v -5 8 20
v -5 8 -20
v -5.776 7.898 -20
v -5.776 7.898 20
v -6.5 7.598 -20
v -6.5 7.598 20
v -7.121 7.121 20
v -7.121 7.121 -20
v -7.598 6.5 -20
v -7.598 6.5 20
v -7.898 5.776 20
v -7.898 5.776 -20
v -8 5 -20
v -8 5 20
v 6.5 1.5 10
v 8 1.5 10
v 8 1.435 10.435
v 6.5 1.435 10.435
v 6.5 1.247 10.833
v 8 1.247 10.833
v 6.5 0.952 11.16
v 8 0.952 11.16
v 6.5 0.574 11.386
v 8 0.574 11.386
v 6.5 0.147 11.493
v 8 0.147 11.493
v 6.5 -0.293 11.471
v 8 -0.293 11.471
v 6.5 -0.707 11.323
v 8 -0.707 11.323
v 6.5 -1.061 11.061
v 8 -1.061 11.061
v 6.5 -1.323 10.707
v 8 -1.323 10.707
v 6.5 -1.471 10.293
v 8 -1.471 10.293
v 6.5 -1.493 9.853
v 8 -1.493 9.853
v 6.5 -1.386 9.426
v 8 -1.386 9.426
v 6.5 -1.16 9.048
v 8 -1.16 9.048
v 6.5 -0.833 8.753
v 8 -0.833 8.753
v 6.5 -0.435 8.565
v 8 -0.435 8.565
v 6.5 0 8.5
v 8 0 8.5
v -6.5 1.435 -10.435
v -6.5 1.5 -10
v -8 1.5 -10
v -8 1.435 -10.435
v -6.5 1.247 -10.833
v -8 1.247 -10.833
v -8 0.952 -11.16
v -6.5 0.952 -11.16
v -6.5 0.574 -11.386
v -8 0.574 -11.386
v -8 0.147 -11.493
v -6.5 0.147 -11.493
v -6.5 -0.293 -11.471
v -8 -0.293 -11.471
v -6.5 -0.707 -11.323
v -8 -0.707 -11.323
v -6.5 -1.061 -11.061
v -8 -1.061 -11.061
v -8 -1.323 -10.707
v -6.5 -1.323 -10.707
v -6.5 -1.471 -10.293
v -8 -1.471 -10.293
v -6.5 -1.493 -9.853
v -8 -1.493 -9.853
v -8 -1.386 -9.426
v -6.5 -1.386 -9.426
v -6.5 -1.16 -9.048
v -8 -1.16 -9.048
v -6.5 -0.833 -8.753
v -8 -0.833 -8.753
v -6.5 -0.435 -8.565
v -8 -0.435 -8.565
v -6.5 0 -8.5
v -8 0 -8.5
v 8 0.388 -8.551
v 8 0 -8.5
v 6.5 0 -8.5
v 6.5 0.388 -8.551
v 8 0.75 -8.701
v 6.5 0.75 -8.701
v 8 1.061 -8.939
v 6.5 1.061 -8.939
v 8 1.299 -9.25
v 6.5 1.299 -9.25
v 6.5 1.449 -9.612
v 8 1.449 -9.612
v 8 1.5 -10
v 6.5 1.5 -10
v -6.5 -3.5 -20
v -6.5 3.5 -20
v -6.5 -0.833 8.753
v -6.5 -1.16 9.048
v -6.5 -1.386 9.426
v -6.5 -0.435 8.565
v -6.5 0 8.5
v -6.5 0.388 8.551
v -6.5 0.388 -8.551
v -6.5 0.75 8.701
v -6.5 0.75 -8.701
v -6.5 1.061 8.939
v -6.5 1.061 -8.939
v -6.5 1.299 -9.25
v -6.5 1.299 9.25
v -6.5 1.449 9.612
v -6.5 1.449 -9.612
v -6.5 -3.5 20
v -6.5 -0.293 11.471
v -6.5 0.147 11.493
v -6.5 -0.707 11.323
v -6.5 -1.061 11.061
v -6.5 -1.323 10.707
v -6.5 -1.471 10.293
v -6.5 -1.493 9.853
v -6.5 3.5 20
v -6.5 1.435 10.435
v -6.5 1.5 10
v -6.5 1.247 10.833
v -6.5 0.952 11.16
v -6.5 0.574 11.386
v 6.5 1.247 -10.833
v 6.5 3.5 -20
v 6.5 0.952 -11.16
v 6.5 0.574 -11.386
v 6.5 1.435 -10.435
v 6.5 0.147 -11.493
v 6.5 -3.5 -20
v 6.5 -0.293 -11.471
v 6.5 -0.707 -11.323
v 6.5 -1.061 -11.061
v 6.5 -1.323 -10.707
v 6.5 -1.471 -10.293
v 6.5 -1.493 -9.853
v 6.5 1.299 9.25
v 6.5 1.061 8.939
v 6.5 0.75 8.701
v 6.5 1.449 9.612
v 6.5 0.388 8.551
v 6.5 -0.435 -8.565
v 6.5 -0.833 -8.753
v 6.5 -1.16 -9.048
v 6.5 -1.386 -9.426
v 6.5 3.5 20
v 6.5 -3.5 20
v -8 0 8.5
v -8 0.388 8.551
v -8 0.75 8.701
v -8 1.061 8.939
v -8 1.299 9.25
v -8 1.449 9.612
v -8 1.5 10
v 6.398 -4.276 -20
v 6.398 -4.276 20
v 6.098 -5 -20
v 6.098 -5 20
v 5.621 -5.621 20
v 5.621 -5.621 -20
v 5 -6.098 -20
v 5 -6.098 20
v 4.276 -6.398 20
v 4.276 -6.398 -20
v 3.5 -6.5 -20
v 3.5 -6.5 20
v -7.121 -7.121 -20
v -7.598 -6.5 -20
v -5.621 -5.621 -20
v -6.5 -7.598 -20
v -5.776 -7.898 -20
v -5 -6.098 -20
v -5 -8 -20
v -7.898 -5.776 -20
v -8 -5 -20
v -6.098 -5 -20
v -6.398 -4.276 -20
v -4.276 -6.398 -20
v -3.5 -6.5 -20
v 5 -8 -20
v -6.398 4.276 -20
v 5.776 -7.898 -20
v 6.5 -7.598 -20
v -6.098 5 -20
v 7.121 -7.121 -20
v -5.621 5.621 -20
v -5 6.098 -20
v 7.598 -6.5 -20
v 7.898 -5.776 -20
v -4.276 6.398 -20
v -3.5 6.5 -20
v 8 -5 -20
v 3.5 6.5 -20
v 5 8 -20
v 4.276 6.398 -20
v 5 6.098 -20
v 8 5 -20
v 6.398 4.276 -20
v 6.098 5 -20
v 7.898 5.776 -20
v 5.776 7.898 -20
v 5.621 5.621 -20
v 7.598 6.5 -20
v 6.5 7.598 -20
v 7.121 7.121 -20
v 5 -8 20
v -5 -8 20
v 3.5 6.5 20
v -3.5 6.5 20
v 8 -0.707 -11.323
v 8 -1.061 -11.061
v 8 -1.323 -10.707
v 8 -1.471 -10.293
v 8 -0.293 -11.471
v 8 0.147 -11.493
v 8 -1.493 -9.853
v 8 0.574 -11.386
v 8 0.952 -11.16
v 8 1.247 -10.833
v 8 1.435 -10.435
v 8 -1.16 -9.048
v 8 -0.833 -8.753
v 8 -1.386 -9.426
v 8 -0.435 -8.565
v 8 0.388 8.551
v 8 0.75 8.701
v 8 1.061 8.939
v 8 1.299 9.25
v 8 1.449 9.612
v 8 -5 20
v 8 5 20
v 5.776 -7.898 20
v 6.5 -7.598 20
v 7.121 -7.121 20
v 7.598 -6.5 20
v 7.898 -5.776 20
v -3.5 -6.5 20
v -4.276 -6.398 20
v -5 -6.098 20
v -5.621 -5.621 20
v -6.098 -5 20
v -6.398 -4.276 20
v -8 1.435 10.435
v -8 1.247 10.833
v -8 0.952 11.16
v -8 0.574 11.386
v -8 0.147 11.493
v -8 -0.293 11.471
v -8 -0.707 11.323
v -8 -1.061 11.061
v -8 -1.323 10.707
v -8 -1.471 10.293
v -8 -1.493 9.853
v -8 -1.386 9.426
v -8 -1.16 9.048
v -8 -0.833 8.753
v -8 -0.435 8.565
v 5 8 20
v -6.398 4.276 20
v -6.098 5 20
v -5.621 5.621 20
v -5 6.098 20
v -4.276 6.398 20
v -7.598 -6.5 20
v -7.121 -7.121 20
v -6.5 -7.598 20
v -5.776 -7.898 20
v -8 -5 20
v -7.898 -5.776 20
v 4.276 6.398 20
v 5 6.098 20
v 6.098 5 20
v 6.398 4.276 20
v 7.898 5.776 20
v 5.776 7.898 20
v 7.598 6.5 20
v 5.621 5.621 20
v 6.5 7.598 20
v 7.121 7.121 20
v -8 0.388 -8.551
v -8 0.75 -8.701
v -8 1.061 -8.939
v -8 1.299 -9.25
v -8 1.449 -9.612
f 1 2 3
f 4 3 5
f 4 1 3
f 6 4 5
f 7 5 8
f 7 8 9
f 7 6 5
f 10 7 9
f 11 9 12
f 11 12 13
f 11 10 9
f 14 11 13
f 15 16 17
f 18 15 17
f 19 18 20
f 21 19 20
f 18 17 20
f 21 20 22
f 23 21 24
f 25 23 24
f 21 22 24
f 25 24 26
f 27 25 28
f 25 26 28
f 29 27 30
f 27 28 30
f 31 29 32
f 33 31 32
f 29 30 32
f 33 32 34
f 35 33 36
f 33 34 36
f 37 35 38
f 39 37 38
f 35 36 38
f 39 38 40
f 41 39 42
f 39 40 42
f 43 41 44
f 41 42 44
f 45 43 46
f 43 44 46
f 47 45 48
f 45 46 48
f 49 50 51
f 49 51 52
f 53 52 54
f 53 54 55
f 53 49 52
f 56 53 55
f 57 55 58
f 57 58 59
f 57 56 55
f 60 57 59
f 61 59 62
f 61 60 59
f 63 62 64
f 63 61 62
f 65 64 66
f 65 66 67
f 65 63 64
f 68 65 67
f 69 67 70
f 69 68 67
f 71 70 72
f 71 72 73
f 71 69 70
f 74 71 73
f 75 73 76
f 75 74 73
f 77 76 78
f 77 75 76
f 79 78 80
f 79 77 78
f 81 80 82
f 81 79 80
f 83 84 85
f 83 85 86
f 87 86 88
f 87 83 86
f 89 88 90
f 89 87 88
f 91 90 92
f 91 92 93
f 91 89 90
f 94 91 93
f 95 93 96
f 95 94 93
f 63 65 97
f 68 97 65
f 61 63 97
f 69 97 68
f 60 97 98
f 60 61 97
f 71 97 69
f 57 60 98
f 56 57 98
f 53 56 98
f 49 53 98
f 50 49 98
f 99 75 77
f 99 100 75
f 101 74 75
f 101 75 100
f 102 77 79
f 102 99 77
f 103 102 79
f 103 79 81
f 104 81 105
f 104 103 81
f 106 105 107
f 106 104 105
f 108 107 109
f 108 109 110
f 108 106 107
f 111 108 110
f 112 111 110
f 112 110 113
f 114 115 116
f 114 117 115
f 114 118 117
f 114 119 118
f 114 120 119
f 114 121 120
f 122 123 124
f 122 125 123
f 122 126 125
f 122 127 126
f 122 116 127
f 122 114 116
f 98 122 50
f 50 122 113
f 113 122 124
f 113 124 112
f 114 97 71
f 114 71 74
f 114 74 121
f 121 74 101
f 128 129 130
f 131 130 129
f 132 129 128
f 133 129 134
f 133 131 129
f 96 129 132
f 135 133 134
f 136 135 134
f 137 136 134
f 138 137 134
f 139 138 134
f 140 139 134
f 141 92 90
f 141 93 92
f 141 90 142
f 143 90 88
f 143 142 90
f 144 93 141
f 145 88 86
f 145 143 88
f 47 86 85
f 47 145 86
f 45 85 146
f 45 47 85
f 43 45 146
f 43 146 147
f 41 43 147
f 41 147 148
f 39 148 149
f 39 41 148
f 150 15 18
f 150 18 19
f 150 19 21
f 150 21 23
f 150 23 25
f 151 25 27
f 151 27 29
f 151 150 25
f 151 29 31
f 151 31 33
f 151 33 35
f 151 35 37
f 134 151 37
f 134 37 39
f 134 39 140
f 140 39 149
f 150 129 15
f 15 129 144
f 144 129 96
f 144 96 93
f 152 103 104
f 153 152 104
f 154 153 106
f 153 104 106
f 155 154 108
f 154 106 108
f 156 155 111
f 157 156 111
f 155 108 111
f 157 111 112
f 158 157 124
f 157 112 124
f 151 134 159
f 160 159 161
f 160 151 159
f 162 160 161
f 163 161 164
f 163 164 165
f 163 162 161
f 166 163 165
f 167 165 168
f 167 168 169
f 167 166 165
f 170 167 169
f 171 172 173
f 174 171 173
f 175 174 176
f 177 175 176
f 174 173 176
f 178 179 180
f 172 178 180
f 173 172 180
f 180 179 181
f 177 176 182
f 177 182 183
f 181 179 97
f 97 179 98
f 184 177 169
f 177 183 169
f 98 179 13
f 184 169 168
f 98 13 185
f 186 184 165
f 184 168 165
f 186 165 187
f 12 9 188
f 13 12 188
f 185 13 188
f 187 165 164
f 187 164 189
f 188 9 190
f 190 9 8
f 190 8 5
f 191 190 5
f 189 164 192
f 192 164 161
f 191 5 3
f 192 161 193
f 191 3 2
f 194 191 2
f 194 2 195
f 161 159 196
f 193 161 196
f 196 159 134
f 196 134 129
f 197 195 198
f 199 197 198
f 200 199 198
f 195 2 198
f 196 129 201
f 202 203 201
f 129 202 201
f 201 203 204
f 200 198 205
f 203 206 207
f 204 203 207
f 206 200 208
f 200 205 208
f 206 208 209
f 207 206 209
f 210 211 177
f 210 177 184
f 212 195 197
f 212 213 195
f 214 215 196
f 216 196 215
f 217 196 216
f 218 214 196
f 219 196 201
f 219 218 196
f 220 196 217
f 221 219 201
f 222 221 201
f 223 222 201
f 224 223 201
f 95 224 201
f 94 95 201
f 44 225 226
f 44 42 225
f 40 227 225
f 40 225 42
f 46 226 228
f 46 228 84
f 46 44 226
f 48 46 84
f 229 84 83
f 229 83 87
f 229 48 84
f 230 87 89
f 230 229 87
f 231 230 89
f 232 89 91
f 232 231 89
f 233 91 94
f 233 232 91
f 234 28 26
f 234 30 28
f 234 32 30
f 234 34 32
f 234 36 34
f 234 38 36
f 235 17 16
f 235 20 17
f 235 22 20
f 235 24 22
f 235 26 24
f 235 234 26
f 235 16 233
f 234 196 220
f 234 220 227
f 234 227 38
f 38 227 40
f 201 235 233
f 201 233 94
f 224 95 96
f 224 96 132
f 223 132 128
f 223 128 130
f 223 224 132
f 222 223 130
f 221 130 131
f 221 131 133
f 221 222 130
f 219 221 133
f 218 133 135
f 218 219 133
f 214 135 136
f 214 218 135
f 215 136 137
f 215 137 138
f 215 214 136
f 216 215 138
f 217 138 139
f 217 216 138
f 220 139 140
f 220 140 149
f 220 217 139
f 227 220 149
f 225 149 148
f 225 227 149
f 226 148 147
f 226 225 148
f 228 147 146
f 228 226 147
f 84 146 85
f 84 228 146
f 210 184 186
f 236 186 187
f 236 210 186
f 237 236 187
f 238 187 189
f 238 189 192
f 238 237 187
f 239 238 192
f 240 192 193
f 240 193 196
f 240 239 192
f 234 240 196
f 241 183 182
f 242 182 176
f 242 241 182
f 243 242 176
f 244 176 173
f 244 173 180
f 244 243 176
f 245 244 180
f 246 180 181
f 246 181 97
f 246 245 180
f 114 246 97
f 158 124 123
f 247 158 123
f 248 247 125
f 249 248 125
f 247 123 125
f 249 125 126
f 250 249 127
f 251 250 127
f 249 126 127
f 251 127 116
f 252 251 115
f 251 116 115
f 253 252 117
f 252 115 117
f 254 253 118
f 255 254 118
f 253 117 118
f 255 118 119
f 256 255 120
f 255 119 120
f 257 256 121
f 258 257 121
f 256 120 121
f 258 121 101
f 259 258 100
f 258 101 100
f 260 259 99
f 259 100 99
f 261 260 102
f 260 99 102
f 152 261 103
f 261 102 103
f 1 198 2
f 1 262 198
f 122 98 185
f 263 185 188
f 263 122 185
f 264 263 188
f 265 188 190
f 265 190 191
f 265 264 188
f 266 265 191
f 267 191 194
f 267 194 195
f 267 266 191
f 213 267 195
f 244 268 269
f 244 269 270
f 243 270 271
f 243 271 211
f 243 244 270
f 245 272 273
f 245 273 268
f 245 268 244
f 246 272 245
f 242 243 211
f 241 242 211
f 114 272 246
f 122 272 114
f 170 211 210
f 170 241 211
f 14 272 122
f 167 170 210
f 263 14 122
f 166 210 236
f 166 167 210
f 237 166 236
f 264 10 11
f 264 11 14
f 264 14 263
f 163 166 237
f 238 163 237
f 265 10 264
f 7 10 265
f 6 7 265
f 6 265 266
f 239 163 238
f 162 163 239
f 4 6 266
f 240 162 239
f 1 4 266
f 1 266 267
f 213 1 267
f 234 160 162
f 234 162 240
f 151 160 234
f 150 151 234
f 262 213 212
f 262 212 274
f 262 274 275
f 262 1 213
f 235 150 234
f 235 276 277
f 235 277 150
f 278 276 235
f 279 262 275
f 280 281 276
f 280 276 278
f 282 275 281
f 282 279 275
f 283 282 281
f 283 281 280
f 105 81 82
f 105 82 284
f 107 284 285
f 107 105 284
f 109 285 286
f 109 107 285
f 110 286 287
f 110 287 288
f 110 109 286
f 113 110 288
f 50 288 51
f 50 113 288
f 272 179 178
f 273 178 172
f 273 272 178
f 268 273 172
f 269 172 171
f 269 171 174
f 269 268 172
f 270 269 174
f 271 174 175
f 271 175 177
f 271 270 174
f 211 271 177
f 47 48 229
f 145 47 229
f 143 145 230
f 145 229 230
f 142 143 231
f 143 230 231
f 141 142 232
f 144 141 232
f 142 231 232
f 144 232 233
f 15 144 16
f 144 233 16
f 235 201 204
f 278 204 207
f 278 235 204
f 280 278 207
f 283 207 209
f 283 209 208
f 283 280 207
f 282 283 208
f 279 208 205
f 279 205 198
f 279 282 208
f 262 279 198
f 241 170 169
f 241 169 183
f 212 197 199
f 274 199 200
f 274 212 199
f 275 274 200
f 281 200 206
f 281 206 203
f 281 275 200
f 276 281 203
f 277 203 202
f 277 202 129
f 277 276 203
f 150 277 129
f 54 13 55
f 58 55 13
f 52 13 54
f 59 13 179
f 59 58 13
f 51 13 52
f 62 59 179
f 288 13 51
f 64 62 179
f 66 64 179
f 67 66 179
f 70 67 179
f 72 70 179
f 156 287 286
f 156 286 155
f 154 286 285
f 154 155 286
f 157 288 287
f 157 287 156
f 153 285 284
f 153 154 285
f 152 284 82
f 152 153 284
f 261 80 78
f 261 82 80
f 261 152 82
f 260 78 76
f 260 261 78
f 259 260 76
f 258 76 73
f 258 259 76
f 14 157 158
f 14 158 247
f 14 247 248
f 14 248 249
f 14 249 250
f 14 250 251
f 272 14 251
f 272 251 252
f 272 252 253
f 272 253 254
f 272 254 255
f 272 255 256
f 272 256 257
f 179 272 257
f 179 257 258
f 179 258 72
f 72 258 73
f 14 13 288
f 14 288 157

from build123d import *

# Parameters (mm, degrees)
F1_DEPTH = 20
F3_DEPTH = 25


with BuildPart() as f1:
    # F0 (on Top) → F1 (new body)
    with BuildSketch(Plane.XY):
        with BuildLine():
            ThreePointArc((-8, -5), (-7.12132, -7.12132), (-5, -8))
            Line((-5, -8), (5, -8))
            ThreePointArc((5, -8), (7.12132, -7.12132), (8, -5))
            Line((8, -5), (8, 5))
            ThreePointArc((8, 5), (7.12132, 7.12132), (5, 8))
            Line((5, 8), (-5, 8))
            ThreePointArc((-5, 8), (-7.12132, 7.12132), (-8, 5))
            Line((-8, 5), (-8, -5))
        make_face()
        with BuildLine():
            Line((3.5, -6.5), (-3.5, -6.5))
            ThreePointArc((-3.5, -6.5), (-5.62132, -5.62132), (-6.5, -3.5))
            Line((-6.5, -3.5), (-6.5, 3.5))
            ThreePointArc((-6.5, 3.5), (-5.62132, 5.62132), (-3.5, 6.5))
            Line((-3.5, 6.5), (3.5, 6.5))
            ThreePointArc((3.5, 6.5), (5.62132, 5.62132), (6.5, 3.5))
            Line((6.5, 3.5), (6.5, -3.5))
            ThreePointArc((6.5, -3.5), (5.62132, -5.62132), (3.5, -6.5))
        make_face(mode=Mode.SUBTRACT)
    extrude(amount=F1_DEPTH)

    # F2 (on face) → F3 (cut)
    with BuildSketch(Plane.YZ.offset(8)):
        with BuildLine():
            ThreePointArc((1.5, 10), (-1.06066, 11.06066), (0, 8.5))
            ThreePointArc((0, 8.5), (1.06066, 8.93934), (1.5, 10))
        make_face()
    extrude(amount=-F3_DEPTH, mode=Mode.SUBTRACT)

    # F4: F1 across plane


with BuildPart() as f1_1:
    add(f1.part)
    add(f1.part.mirror(Plane.XY))


solid = f1_1.part
